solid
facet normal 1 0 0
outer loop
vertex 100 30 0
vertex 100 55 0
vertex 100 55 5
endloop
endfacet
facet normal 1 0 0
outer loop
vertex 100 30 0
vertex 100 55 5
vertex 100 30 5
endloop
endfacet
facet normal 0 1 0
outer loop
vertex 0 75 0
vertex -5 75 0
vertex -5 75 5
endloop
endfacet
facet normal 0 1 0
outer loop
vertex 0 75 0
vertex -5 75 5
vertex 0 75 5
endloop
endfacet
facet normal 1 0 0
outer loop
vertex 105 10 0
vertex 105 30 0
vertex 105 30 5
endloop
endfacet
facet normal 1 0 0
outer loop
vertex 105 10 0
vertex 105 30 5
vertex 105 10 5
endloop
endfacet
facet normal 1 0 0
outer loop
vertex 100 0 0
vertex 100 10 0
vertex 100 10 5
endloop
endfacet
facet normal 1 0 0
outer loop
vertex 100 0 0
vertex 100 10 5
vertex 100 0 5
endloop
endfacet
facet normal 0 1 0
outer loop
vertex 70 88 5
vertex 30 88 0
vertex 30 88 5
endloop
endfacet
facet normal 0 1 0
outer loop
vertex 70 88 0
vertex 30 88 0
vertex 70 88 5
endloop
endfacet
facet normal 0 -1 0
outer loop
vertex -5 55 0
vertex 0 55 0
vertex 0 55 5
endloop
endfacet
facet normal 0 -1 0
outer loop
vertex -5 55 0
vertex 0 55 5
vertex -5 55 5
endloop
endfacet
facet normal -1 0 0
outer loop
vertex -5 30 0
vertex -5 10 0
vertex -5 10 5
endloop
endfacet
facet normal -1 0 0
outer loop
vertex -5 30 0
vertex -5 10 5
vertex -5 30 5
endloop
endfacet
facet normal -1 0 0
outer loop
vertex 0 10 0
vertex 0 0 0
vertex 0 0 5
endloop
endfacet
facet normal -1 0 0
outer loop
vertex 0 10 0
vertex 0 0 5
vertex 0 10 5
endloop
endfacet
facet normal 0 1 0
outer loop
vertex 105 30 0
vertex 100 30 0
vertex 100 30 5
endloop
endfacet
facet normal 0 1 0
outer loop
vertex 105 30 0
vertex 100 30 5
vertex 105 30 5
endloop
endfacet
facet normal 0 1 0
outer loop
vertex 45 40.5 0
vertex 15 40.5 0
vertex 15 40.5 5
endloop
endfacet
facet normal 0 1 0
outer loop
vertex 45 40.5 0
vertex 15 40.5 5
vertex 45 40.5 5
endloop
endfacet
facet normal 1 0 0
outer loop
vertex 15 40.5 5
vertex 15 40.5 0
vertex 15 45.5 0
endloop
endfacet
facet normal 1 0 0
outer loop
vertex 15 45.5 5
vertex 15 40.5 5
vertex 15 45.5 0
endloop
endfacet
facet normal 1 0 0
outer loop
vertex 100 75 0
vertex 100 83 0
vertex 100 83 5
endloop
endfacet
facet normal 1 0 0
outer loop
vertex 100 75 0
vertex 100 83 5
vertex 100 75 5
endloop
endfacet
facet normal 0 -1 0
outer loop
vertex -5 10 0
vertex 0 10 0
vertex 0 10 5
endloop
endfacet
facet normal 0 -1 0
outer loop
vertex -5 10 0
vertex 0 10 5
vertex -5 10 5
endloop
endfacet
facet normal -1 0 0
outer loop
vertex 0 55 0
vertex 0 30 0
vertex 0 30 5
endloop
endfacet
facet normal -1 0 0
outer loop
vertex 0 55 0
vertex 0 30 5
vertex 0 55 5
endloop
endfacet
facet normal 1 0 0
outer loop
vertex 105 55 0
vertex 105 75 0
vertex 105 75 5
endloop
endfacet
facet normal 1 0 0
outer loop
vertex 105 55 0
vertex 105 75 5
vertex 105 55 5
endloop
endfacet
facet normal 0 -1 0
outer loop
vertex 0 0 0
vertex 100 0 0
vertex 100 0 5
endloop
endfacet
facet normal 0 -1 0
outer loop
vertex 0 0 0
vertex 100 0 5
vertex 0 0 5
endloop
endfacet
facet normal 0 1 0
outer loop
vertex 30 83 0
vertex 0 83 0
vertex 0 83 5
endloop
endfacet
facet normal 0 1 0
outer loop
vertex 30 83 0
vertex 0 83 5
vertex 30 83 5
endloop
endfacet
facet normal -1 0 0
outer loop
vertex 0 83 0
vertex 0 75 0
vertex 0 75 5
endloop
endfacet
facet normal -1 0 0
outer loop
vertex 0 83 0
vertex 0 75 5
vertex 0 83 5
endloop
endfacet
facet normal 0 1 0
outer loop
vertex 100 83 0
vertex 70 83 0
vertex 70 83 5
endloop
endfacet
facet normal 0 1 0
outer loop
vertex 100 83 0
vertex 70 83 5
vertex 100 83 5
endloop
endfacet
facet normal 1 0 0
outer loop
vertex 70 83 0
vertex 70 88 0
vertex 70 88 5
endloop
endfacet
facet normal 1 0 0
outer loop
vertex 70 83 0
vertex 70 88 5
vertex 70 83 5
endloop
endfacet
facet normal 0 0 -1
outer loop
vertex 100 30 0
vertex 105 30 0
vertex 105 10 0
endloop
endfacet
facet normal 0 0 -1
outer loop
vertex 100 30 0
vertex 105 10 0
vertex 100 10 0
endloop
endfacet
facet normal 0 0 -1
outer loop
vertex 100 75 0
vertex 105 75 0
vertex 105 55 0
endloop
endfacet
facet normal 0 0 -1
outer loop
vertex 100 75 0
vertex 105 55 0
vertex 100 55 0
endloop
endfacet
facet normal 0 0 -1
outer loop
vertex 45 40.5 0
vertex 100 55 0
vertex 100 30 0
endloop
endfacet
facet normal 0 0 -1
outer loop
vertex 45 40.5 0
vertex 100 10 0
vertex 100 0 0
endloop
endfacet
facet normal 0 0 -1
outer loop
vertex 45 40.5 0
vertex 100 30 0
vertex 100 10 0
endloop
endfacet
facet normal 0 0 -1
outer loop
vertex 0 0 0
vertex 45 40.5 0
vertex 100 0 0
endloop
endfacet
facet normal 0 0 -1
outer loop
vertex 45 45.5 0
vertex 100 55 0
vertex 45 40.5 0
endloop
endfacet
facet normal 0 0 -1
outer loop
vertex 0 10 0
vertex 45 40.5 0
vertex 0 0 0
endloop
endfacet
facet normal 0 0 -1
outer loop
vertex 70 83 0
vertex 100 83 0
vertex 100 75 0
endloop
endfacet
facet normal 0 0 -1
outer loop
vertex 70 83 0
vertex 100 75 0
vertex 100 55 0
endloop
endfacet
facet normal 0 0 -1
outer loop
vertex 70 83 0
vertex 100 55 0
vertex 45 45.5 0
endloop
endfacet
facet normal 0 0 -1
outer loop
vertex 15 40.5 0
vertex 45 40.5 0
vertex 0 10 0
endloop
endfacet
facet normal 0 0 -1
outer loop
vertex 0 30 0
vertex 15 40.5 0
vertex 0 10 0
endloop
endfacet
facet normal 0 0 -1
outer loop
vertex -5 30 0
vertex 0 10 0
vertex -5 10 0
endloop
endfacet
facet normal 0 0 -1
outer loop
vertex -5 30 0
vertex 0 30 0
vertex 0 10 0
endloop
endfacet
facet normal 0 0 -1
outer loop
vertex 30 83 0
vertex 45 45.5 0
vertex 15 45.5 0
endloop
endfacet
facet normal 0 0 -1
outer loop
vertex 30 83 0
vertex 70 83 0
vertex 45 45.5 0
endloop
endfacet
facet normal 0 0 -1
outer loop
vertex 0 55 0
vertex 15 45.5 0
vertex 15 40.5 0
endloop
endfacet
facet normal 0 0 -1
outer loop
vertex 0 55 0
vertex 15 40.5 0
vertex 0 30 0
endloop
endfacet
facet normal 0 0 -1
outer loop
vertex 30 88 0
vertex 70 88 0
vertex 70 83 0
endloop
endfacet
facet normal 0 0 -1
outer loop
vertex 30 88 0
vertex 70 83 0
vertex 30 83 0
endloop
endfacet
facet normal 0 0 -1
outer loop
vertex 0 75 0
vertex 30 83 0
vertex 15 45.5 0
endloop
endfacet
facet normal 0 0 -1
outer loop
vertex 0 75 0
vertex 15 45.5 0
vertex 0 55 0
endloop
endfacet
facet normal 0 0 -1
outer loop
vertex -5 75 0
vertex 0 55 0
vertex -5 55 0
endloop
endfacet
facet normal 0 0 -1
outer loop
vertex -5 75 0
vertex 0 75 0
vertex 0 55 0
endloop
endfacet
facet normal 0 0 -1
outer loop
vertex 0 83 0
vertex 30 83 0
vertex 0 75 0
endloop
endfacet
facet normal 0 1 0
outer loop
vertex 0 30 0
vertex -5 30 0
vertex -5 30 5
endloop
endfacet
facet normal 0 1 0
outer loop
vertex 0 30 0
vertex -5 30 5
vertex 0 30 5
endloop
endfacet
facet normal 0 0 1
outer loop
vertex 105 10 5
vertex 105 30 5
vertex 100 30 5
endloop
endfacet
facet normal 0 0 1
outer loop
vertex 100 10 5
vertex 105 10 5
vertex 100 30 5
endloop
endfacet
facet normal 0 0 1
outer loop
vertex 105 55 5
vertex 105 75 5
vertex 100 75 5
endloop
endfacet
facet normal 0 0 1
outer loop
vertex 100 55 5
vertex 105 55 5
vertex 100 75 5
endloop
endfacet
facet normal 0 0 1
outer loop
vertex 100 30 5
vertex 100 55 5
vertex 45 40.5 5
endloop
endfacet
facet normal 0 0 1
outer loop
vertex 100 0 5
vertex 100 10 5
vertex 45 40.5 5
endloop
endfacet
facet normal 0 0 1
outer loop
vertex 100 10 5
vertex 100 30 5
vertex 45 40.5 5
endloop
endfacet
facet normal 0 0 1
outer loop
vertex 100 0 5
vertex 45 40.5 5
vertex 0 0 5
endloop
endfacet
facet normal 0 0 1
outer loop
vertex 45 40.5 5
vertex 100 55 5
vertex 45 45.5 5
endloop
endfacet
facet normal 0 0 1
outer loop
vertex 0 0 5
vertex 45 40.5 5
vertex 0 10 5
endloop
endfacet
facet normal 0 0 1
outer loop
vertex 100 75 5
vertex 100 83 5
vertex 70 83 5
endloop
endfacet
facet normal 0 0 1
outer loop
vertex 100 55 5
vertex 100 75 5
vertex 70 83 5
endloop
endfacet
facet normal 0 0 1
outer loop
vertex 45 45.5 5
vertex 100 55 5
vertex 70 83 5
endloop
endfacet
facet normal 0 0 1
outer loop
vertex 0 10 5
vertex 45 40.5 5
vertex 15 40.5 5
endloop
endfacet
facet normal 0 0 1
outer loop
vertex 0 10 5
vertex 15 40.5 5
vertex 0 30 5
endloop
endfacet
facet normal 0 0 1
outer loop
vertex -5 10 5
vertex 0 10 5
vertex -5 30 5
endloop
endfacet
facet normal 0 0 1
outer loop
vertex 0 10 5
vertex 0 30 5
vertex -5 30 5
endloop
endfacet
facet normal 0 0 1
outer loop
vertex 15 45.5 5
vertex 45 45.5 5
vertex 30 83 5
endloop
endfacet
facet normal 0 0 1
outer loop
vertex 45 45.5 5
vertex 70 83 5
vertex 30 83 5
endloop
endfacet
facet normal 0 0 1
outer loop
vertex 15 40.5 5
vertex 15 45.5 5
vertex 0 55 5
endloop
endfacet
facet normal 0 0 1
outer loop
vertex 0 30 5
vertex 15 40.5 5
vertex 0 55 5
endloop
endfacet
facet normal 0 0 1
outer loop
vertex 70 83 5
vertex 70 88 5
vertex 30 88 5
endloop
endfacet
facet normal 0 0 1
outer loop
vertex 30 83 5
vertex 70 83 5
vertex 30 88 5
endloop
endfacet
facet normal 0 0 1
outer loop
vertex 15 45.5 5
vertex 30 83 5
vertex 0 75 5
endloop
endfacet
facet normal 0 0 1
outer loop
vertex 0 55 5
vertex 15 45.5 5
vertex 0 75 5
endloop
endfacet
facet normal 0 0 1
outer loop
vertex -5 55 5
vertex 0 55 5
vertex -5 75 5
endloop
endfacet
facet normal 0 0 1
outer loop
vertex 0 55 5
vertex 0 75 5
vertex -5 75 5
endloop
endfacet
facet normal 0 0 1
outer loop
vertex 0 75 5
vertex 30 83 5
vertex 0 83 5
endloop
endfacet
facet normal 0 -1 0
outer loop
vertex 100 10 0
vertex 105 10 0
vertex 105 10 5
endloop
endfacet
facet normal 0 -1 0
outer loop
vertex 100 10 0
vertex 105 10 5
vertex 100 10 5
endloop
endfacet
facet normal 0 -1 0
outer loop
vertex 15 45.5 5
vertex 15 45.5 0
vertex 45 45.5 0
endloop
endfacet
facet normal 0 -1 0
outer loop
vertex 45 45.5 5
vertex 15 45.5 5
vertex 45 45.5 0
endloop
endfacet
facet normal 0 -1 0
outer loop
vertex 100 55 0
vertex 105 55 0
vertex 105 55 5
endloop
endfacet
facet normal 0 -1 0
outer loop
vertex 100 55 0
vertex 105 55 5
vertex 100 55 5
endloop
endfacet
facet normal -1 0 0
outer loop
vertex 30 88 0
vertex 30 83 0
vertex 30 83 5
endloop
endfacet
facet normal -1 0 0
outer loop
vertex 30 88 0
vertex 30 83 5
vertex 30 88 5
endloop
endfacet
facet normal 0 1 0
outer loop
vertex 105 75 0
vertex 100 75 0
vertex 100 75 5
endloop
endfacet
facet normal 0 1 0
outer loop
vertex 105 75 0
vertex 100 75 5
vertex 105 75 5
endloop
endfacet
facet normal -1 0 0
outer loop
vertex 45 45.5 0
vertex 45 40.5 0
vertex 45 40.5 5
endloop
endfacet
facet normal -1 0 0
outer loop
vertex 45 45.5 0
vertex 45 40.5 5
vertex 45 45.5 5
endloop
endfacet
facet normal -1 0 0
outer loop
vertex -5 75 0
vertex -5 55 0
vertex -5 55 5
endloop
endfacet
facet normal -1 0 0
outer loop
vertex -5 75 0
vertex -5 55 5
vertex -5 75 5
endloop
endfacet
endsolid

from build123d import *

# Parameters (mm, degrees)
SKETCH_1_W      = 30
SKETCH_1_H      = 5
EXTRUDE_1_DEPTH = 5


with BuildPart() as part:
    # 草图1 → 凸台-拉伸1 (new body)
    with BuildSketch(Plane.XY):
        Polygon((0, 75), (0, 83), (30, 83), (30, 88), (70, 88), (70, 83), (100, 83), (100, 75), (105, 75), (105, 55), (100, 55), (100, 30), (105, 30), (105, 10), (100, 10), (100, 0), (0, 0), (0, 10), (-5, 10), (-5, 30), (0, 30), (0, 55), (-5, 55), (-5, 75), align=None)
        with Locations((30, 43)):
            Rectangle(SKETCH_1_W, SKETCH_1_H, mode=Mode.SUBTRACT)
    extrude(amount=EXTRUDE_1_DEPTH)


solid = part.part
